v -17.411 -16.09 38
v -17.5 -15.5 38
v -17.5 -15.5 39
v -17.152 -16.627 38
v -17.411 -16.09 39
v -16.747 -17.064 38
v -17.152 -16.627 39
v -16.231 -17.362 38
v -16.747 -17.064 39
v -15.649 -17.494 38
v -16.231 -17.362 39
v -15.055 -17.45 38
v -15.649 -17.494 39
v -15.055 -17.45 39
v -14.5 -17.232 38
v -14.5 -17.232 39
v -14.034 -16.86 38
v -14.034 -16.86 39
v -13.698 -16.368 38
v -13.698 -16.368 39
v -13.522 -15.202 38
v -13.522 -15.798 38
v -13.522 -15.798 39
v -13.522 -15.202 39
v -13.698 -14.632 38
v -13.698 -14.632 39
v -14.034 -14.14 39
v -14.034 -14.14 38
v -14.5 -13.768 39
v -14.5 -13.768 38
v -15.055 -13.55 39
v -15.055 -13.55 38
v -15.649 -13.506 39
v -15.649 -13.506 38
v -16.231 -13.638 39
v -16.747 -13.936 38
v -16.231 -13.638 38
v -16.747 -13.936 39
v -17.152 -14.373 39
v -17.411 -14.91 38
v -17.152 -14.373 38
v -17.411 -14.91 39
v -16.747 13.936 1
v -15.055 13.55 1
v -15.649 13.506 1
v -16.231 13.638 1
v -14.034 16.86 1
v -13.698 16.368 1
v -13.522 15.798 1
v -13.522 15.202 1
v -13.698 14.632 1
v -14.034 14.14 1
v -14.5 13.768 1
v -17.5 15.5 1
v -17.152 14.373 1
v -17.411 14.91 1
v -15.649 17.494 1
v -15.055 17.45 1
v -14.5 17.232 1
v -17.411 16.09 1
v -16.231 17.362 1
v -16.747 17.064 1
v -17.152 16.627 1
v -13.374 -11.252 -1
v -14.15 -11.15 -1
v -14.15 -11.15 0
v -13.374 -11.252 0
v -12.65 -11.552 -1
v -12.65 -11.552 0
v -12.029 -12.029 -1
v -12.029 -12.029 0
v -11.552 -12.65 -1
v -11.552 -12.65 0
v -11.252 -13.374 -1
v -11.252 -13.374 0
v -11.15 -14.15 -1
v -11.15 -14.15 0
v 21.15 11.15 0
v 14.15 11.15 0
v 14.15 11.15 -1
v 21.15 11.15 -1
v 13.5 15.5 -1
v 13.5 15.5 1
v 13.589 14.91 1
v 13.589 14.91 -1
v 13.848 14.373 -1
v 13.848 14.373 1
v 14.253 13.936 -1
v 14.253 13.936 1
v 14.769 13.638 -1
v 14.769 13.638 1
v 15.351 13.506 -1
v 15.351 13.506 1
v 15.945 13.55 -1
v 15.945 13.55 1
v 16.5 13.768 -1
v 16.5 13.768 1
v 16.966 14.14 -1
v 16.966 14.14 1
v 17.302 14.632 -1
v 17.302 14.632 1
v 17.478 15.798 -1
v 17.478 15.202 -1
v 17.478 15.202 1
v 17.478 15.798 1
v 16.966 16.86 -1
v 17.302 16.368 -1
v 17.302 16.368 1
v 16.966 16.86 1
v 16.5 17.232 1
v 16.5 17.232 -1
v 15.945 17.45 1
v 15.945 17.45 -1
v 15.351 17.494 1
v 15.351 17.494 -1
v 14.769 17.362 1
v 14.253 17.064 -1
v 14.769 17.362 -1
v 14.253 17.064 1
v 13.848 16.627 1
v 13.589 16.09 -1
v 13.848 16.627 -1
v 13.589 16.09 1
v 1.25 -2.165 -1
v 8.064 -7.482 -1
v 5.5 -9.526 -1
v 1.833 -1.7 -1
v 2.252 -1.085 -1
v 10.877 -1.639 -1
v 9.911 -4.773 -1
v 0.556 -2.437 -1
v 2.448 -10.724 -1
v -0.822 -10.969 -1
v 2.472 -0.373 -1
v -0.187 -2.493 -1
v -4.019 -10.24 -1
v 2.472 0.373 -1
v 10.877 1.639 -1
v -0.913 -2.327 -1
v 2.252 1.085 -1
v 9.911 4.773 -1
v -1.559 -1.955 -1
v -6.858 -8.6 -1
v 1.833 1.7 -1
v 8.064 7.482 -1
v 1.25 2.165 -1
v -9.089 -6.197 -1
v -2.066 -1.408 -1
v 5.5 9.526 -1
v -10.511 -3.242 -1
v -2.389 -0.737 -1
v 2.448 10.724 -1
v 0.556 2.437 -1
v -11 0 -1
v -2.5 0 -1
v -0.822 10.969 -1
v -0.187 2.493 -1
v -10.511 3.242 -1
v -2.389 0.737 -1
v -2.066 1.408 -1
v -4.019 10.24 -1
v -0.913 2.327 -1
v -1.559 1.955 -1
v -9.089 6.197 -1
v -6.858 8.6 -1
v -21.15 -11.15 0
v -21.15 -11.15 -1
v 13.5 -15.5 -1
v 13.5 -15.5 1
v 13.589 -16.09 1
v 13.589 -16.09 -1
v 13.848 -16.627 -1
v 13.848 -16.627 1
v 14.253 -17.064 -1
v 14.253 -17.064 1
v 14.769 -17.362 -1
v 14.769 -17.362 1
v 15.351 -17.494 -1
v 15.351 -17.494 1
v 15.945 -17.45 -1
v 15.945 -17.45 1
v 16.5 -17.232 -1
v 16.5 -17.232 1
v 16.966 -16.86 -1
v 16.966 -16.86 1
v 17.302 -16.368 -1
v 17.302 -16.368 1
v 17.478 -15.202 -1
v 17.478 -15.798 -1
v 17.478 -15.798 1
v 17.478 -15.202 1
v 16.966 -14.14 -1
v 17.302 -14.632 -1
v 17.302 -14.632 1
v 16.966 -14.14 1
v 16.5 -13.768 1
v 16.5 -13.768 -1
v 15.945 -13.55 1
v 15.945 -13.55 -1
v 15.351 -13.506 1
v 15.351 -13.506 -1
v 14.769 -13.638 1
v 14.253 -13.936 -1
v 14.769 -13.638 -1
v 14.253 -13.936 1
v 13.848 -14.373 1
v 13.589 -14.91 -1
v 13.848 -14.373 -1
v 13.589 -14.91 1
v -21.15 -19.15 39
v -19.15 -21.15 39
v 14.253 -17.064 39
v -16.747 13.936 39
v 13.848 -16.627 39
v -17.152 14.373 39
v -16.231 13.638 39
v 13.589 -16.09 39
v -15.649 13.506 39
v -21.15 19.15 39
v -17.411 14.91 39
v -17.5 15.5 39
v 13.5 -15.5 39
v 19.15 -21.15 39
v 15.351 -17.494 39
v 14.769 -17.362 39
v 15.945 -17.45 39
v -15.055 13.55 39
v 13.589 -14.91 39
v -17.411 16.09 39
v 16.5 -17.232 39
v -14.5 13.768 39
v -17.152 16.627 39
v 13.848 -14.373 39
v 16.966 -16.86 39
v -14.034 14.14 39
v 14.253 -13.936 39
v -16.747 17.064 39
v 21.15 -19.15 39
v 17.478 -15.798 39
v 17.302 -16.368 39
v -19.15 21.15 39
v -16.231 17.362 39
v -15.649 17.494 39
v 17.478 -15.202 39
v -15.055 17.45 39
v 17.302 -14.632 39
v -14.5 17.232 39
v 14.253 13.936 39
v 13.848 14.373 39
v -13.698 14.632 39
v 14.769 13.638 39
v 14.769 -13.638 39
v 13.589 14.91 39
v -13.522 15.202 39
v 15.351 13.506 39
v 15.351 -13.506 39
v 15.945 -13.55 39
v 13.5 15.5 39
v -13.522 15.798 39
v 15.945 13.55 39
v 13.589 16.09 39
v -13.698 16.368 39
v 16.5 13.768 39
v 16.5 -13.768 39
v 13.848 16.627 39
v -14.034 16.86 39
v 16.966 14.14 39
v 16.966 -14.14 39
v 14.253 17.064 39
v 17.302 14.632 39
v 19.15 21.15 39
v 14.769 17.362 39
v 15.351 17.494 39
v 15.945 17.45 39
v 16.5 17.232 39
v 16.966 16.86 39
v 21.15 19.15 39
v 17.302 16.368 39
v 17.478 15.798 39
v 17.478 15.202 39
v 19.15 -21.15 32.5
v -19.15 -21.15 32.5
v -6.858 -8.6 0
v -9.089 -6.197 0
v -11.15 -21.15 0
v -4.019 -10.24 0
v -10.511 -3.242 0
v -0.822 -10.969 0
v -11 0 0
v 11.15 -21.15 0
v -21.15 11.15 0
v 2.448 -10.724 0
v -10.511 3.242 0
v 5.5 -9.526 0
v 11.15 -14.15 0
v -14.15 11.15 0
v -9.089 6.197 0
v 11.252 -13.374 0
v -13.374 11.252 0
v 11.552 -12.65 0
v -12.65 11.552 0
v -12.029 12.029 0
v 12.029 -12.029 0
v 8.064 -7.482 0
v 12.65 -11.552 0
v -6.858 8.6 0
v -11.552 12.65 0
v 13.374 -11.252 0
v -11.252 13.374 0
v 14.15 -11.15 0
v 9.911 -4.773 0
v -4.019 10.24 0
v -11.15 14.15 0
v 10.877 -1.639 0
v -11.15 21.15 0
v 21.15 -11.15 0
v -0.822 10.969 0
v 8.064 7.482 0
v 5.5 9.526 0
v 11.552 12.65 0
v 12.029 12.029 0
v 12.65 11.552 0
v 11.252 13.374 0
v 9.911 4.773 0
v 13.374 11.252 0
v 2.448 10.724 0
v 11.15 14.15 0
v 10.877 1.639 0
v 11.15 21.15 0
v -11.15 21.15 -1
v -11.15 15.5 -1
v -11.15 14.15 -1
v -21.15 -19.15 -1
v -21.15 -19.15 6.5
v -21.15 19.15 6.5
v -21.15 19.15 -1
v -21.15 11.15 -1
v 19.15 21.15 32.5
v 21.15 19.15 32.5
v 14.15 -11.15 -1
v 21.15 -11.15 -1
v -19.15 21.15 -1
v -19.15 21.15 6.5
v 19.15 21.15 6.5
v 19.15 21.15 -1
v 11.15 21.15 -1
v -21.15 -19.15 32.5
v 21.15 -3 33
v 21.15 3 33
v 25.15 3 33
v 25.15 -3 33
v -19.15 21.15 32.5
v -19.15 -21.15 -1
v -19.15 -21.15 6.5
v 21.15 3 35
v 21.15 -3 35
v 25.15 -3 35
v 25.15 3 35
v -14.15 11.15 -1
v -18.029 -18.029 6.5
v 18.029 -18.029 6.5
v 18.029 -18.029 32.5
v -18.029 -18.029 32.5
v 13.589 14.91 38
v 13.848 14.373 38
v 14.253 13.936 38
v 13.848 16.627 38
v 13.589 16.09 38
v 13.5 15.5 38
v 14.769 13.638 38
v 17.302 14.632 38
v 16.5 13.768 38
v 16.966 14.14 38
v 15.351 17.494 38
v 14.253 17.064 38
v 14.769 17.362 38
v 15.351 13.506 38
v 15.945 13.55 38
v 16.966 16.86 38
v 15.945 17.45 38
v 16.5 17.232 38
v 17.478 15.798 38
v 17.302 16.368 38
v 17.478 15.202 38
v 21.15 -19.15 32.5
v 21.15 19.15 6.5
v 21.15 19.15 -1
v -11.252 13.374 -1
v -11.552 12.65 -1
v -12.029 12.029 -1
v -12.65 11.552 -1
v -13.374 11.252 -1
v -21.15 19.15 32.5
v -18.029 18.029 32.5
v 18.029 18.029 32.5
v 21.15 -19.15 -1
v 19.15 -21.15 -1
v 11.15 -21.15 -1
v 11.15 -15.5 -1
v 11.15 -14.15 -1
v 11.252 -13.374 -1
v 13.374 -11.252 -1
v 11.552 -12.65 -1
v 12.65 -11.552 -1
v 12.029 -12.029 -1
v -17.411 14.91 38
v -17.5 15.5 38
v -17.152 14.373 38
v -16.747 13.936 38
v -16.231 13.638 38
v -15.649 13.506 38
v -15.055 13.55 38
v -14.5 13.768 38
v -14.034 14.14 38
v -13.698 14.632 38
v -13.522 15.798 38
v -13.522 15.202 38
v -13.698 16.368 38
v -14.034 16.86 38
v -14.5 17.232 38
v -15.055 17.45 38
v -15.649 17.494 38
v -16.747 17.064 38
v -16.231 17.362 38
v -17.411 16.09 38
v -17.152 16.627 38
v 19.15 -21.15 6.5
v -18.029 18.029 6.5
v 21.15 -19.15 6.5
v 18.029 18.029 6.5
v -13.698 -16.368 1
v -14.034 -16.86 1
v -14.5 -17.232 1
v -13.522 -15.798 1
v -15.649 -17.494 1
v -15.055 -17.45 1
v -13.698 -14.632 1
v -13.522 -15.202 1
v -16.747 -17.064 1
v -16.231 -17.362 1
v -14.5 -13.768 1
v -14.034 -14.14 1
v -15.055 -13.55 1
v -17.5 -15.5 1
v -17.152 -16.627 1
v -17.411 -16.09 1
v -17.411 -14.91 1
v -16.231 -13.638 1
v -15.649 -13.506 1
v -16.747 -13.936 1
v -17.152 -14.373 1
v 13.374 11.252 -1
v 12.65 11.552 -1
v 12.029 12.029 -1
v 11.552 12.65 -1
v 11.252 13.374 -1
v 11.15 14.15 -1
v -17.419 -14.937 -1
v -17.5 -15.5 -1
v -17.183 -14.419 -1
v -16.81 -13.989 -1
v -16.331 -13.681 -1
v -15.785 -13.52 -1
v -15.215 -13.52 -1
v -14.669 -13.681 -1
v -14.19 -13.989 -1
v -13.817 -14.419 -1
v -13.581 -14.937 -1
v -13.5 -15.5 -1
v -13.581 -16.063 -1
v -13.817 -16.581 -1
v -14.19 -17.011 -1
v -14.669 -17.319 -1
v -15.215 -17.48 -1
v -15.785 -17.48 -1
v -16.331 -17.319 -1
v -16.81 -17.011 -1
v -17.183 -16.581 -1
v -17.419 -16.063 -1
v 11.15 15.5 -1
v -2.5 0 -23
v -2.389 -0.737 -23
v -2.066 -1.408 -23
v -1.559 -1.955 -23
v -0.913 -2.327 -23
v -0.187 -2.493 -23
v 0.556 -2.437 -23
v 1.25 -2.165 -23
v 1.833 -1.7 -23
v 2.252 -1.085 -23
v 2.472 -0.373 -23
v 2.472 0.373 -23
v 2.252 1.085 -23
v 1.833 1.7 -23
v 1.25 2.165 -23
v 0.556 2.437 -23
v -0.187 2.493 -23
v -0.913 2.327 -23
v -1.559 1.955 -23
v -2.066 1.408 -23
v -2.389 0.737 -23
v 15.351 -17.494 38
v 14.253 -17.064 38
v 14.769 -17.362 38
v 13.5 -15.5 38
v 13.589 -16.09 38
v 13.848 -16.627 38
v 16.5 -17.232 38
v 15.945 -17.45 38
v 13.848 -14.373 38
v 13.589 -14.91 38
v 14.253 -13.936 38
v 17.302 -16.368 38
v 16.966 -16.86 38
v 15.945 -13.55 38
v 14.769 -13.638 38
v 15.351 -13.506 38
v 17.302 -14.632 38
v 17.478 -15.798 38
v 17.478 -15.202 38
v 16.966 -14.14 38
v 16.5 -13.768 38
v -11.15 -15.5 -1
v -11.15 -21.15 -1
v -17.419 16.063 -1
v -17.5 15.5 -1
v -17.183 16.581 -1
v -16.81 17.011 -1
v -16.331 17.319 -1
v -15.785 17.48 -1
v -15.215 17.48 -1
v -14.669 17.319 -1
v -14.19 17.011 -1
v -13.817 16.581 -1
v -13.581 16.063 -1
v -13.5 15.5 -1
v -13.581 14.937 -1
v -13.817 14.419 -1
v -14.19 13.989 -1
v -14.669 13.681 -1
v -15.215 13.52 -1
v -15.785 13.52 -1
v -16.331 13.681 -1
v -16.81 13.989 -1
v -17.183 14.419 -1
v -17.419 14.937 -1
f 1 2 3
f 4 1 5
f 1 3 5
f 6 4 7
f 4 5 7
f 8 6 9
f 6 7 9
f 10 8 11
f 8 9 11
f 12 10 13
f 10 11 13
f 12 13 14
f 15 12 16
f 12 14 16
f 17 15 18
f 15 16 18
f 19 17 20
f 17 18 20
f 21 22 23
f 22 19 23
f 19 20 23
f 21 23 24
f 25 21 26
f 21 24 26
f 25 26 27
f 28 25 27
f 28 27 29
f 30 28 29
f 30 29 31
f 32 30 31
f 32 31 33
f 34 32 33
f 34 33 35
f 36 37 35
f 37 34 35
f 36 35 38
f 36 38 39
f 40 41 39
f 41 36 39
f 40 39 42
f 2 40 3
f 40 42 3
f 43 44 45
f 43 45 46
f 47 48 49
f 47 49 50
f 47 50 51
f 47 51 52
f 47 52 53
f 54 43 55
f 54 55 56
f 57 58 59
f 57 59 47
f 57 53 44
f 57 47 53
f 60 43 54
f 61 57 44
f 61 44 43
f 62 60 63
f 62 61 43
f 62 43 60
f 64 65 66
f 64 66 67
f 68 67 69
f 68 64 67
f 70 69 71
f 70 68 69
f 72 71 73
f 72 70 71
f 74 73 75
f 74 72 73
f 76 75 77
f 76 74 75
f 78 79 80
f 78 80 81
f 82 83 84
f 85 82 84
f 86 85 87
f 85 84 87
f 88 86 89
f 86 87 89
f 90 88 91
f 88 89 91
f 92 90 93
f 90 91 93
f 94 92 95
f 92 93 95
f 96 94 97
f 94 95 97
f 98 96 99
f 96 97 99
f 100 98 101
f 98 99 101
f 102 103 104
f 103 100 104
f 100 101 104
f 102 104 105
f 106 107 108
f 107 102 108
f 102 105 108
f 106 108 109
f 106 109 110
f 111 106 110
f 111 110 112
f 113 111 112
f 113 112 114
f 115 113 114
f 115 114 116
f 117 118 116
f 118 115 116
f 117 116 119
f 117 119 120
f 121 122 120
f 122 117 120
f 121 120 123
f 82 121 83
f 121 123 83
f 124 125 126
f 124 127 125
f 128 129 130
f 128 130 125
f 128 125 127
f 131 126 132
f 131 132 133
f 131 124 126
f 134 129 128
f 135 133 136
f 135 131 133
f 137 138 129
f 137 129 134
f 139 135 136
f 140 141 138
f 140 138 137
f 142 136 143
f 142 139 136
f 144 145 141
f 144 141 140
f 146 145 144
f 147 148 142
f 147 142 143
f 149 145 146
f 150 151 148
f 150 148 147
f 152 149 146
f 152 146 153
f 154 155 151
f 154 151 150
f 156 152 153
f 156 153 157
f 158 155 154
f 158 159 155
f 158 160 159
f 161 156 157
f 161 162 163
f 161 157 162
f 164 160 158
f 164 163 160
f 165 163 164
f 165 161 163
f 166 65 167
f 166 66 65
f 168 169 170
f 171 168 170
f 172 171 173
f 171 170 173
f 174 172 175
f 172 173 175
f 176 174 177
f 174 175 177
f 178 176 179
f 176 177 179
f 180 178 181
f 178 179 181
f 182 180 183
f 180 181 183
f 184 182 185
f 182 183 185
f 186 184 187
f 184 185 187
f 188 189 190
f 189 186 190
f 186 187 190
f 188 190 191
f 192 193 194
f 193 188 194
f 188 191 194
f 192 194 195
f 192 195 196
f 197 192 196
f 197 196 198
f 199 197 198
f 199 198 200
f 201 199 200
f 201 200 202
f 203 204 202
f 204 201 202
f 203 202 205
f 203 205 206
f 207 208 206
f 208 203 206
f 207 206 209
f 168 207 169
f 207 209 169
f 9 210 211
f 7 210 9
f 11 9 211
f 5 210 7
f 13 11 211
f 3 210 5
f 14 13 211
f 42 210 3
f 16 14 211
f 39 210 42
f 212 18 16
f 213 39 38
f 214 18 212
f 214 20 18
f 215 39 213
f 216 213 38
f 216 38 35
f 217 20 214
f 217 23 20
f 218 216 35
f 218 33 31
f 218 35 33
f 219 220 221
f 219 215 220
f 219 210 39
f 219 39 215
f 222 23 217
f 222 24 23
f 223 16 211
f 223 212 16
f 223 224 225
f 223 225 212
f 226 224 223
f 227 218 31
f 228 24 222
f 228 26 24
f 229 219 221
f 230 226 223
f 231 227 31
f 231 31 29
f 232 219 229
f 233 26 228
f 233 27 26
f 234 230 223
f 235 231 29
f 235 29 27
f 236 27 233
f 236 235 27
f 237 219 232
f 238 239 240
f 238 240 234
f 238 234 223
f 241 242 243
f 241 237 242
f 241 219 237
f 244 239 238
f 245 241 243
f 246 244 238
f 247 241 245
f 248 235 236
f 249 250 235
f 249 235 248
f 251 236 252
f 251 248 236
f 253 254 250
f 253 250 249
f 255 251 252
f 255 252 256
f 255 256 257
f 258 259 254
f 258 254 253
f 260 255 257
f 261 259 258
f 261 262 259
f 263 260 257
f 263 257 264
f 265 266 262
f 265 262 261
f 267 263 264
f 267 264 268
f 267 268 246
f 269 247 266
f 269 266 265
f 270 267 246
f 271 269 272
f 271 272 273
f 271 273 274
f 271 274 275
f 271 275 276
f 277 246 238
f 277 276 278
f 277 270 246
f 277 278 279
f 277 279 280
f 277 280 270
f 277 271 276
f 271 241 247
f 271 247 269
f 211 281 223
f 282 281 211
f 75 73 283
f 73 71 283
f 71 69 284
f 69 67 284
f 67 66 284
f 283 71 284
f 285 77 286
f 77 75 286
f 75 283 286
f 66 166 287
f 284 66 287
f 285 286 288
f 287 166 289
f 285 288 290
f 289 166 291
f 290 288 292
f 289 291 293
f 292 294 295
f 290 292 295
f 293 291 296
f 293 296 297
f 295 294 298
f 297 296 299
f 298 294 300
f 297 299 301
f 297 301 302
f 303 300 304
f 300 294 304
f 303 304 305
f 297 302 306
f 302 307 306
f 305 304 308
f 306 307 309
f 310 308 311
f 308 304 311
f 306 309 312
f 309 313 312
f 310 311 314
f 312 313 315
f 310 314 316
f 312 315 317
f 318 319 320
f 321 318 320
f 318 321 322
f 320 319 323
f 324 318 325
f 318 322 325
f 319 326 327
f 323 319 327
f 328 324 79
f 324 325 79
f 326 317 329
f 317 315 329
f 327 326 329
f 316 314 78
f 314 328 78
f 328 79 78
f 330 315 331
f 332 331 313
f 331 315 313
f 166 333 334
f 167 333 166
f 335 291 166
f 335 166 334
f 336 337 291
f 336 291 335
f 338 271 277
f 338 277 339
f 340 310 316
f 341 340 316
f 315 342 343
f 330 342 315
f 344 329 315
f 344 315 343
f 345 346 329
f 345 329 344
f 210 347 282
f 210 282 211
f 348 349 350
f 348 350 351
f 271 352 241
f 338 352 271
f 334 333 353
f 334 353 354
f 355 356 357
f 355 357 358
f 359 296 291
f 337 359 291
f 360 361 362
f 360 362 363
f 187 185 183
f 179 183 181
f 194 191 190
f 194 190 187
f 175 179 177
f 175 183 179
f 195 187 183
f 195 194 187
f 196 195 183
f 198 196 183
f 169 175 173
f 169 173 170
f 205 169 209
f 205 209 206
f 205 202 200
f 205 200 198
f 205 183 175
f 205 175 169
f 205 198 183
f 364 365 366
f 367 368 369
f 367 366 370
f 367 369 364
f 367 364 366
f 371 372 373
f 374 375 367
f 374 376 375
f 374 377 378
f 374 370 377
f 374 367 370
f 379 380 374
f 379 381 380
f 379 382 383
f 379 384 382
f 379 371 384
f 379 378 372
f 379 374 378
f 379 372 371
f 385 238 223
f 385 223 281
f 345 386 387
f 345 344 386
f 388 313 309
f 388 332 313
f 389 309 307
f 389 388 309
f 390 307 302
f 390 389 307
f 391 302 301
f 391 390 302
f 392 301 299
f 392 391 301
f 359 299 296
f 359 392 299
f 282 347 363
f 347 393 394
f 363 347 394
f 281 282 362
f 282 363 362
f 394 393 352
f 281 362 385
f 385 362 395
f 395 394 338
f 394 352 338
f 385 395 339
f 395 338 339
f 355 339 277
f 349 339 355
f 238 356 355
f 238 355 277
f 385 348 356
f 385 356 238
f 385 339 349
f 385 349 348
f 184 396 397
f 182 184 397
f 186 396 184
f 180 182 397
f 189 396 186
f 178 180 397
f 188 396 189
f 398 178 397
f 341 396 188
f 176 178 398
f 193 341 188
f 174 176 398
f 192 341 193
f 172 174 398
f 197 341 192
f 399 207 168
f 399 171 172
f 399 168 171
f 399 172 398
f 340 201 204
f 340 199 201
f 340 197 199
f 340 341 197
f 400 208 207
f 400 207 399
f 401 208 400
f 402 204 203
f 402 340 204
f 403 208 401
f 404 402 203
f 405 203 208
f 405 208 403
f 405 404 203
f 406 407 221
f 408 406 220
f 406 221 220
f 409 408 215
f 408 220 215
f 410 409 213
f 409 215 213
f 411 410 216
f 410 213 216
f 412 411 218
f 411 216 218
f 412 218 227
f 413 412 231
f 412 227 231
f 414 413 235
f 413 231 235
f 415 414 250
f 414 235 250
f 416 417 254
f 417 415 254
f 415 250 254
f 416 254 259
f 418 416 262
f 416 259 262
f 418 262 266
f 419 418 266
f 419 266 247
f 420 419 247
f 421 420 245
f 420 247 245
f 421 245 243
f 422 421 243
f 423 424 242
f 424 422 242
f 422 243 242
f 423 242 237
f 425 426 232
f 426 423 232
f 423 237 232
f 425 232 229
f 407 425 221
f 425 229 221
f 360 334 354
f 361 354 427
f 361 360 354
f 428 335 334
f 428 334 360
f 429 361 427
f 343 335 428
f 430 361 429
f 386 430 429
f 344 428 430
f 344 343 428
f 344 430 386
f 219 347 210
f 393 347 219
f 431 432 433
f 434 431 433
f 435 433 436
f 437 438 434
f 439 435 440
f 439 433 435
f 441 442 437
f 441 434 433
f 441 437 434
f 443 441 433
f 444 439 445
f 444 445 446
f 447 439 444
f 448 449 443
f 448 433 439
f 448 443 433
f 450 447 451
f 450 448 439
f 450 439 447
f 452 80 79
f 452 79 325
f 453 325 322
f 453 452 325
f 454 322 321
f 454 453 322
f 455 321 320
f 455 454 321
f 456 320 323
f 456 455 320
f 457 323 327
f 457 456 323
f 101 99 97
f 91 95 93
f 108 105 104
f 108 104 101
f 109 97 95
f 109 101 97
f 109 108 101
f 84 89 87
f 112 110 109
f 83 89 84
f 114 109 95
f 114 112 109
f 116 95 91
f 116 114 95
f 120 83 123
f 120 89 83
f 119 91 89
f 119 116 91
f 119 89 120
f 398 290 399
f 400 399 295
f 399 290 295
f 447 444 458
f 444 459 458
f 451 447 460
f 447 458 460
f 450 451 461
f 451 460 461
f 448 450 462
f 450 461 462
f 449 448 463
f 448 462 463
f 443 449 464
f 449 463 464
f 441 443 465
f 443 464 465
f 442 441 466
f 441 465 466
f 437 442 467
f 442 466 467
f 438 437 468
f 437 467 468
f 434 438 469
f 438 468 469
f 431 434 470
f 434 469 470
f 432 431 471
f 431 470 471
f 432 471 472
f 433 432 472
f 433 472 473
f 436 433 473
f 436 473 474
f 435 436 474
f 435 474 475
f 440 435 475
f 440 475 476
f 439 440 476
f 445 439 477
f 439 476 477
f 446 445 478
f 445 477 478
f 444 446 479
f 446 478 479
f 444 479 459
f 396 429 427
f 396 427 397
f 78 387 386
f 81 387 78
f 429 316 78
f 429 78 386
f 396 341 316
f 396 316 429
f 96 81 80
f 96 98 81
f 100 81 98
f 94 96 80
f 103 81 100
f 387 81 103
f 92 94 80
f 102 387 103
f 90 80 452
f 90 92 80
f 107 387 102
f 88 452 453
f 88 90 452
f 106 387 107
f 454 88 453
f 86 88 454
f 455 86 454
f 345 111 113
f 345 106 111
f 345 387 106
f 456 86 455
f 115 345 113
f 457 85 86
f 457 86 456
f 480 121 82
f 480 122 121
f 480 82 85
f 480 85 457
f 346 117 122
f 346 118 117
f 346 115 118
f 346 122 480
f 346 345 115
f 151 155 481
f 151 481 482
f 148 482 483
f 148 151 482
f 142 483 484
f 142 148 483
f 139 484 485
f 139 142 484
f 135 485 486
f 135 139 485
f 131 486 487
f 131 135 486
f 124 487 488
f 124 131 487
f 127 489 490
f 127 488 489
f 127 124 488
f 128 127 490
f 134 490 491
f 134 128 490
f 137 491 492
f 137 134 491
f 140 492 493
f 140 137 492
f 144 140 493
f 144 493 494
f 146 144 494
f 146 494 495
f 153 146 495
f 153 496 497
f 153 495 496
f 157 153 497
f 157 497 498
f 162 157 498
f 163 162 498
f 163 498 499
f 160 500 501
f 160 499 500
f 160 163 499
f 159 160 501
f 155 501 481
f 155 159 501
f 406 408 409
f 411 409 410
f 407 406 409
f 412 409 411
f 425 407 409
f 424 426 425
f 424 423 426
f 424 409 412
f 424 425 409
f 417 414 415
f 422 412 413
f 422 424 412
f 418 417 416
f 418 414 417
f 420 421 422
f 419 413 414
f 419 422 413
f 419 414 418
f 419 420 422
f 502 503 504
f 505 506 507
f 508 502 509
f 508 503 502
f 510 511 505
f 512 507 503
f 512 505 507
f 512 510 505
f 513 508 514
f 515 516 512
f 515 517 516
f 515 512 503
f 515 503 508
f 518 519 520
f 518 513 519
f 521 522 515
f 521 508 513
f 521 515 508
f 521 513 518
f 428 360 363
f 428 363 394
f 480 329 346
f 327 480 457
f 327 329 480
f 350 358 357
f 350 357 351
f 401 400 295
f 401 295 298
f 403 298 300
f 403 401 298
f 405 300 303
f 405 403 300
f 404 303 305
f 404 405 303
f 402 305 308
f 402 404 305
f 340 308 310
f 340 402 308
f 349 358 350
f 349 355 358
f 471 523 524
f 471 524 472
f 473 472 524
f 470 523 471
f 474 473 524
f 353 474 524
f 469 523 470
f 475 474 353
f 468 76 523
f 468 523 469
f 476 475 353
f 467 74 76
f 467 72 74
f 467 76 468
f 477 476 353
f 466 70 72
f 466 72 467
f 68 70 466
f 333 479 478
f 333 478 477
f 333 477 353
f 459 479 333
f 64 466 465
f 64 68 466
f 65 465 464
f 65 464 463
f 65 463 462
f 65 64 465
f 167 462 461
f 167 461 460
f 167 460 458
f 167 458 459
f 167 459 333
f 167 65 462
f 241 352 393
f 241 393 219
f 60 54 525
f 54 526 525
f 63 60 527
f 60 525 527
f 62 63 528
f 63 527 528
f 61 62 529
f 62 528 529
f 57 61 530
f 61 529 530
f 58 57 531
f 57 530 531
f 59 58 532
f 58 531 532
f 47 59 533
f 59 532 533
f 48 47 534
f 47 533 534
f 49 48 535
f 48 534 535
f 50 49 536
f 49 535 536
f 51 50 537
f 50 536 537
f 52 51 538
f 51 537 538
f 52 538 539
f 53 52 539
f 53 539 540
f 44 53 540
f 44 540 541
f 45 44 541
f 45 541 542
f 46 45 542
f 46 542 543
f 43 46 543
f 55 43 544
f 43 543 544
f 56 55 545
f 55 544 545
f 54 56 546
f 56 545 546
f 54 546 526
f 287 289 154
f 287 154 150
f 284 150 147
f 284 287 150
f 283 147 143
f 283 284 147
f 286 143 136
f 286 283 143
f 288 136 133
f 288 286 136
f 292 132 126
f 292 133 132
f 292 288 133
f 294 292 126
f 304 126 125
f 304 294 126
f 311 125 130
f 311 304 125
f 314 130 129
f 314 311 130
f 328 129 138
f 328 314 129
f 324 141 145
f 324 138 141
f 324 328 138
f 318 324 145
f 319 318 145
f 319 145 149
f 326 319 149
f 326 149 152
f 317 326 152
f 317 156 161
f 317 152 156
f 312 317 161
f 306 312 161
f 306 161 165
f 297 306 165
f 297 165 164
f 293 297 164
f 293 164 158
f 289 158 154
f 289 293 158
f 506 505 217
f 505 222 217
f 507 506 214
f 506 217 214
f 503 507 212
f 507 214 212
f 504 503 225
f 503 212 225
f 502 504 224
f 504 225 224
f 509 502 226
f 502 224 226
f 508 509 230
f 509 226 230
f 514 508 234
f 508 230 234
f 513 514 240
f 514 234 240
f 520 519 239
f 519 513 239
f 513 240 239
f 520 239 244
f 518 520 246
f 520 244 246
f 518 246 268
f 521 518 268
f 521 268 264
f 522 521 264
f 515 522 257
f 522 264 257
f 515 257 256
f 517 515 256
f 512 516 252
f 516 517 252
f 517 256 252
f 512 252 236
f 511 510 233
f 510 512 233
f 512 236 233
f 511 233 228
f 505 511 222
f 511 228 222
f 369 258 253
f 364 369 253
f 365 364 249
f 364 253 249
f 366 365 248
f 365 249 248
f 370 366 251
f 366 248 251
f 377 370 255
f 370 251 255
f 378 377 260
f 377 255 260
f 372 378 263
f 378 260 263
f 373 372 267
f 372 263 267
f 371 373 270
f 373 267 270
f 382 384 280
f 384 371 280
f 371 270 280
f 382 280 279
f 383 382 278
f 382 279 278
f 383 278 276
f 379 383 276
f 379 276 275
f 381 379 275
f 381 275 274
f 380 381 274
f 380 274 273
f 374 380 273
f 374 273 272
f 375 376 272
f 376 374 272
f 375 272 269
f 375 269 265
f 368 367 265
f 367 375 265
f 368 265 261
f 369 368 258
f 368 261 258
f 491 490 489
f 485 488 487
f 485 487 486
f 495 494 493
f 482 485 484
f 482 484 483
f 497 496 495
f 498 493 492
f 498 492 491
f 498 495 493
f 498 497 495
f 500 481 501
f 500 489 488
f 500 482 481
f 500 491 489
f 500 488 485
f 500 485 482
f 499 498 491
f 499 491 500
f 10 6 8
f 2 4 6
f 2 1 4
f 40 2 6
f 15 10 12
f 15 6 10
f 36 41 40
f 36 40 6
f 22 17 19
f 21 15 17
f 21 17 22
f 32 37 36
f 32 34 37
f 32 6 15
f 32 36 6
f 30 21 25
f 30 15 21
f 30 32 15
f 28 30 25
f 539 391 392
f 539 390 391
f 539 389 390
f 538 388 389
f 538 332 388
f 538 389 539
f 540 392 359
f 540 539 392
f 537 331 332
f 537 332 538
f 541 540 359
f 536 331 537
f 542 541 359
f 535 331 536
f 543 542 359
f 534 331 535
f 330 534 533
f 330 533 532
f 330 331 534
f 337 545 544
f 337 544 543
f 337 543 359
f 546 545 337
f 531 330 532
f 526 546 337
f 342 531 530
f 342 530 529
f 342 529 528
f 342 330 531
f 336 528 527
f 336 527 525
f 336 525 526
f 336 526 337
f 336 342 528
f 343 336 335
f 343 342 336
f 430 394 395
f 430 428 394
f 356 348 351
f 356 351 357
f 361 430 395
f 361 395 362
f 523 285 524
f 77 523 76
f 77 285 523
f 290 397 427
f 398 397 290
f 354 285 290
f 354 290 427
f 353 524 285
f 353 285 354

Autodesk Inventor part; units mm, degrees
ref_plane "YZ Plane" through (0, 0, 0) normal (1, 0, 0) x (0, 1, 0)
ref_plane "XZ Plane" through (0, 0, 0) normal (0, 1, 0) x (-1, 0, 0)
sketch "Sketch1" plane through (0, 0, 0) normal (0, 0, 1) x (1, 0, 0)
  line L0 (0, 0) -> (0, 3.4207)
  line L1 (0, 0) -> (9.2929, 0)
  line L2 (21.15, -21.15) -> (-21.15, -21.15)
  line L3 (-21.15, -21.15) -> (-21.15, 21.15)
  line L4 (-21.15, 21.15) -> (21.15, 21.15)
  line L5 (21.15, 21.15) -> (21.15, -21.15)
  point P0 (0, 21.15)
  point P1 (21.15, 0)
  dimension "d0" = 42.3
  dimension "d1" = 42.3
extrude "Extrusion1" add sketch "Sketch1" along normal blind 39
sketch "Sketch2" plane through (0, 0, 0) normal (0, 0, -1) x (-1, 0, 0)
  line L0 (-21.15, 21.15) -> (-21.15, -21.15) projected
  circle A0 centre (-15.5, 15.5) radius 2
  circle A1 centre (15.5, 15.5) radius 2
  line L1 (-15.5, 15.5) -> (15.5, 15.5)
  line L2 (0, 0) -> (0, 5.3355)
  line L3 (0, 0) -> (5.467, 0)
  circle A2 centre (-15.5, -15.5) radius 2
  circle A3 centre (15.5, -15.5) radius 2
  line L4 (-15.5, -15.5) -> (15.5, -15.5)
  line L5 (-21.15, 21.15) -> (-11.15, 21.15)
  line L6 (-11.15, 21.15) -> (-11.15, 11.15)
  line L7 (-11.15, 11.15) -> (-21.15, 11.15)
  line L8 (-21.15, 11.15) -> (-21.15, 21.15)
  line L9 (21.15, 21.15) -> (11.15, 21.15)
  line L10 (11.15, 21.15) -> (11.15, 11.15)
  line L11 (11.15, 11.15) -> (21.15, 11.15)
  line L12 (21.15, 11.15) -> (21.15, 21.15)
  line L13 (21.15, -21.15) -> (11.15, -21.15)
  line L14 (11.15, -21.15) -> (11.15, -11.15)
  line L15 (11.15, -11.15) -> (21.15, -11.15)
  line L16 (21.15, -11.15) -> (21.15, -21.15)
  line L17 (-21.15, -21.15) -> (-11.15, -21.15)
  line L18 (-11.15, -21.15) -> (-11.15, -11.15)
  line L19 (-11.15, -11.15) -> (-21.15, -11.15)
  line L20 (-21.15, -11.15) -> (-21.15, -21.15)
  circle A4 centre (0, 0) radius 11
  point P0 (0, 15.5)
  point P1 (0, -15.5)
  dimension "d4" = 4
  dimension "d5" = 4
  dimension "d6" = 31
  dimension "d7" = 31
  dimension "d8" = 10
  dimension "d9" = 10
  dimension "d10" = 10
  dimension "d11" = 10
  dimension "d12" = 10
  dimension "d13" = 10
  dimension "d14" = 10
  dimension "d15" = 10
  dimension "d20" = 22
extrude "Extrusion2" add sketch "Sketch2" along normal blind 1 contours A0 | L5 L6 L7 L0 | A1 | L10 L9 L12 L11 | A3 | L14 L15 L16 L13 | A2 | L19 L18 L17 L0
extrude "Extrusion3" cut sketch "Sketch2" along normal mid plane 2 contours A0 | A1 | A3 | A2
extrude "Extrusion4" add sketch "Sketch2" along normal blind 1 contours A4
fillet "Fillet1" radius 3 4 edges at (11.15, 11.15, -0.5) (11.15, -11.15, -0.5) (-11.15, -11.15, -0.5) (-11.15, 11.15, -0.5)
chamfer "Chamfer1" distance 2 angle 45 4 edges at (21.15, -21.15, 19) (-21.15, -21.15, 19) (-21.15, 21.15, 19) (21.15, 21.15, 19)
sketch "Sketch3" plane through (0, 0, -1) normal (0, 0, -1) x (-1, 0, 0)
  circle A0 centre (0, 0) radius 11 projected
  circle A1 centre (0, 0) radius 2.5
  dimension "d27" = 5
extrude "Extrusion5" add sketch "Sketch3" along normal blind 22 contours A1
ref_plane "Work Plane1" through (0, 0, 19.5) normal (0, 0, 1) x (1, 0, 0)
mirror "Mirror1" about plane through (0, 0, 19.5) normal (0, 0, 1) of "Extrusion3"
sketch "Sketch4" plane through (21.15, -11.15, 0) normal (1, 0, 0) x (0, 0, -1)
  line L0 (-39, -8) -> (-39, 30.3) projected
  line L1 (-35, 14.15) -> (-33, 14.15)
  line L2 (-33, 14.15) -> (-33, 8.15)
  line L3 (-33, 8.15) -> (-35, 8.15)
  line L4 (-35, 8.15) -> (-35, 14.15)
  line L5 (-39, 11.15) -> (-36.6866, 11.15)
  point P0 (0, 11.15)
  point P1 (-35, 11.15)
  dimension "d31" = 2
  dimension "d32" = 6
  dimension "d33" = 4
extrude "Extrusion6" add sketch "Sketch4" along normal blind 4
sketch "Sketch6" plane through (0, 0, 19.5) normal (0, 0, 1) x (1, 0, 0)
  line L0 (-21.15, 19.15) -> (-19.15, 21.15) projected
  line L1 (-19.15, 21.15) -> (19.15, 21.15) projected
  line L2 (19.15, 21.15) -> (21.15, 19.15) projected
  line L3 (21.15, 19.15) -> (21.15, -19.15) projected
  line L4 (21.15, -19.15) -> (19.15, -21.15) projected
  line L5 (19.15, -21.15) -> (-19.15, -21.15) projected
  line L6 (-19.15, -21.15) -> (-21.15, -19.15) projected
  line L7 (-21.15, -19.15) -> (-21.15, 19.15) projected
  line L8 (-17.7379, 17.7408) -> (-17.7408, 17.7379)
  line L9 (-17.7408, -17.7379) -> (-17.7379, -17.7408)
  line L10 (17.7379, -17.7408) -> (17.7408, -17.7379)
  line L11 (17.7408, 17.7379) -> (17.7379, 17.7408)
  line L12 (-21.15, 14.9074) -> (-14.9074, 21.15)
  line L13 (-18.0287, 18.0287) -> (18.0287, 18.0287)
  line L14 (18.0287, 18.0287) -> (18.0287, -18.0287)
  line L15 (18.0287, -18.0287) -> (-18.0287, -18.0287)
  line L16 (-18.0287, -18.0287) -> (-18.0287, 18.0287)
  line L17 (-21.15, 14.9074) -> (-21.15, 19.15)
  line L18 (-19.15, 21.15) -> (-21.15, 19.15)
  line L19 (-19.15, 21.15) -> (-14.9074, 21.15)
  line L20 (-14.9074, -21.15) -> (-21.15, -14.9074)
  line L21 (-14.9074, -21.15) -> (-19.15, -21.15)
  line L22 (-21.15, -19.15) -> (-19.15, -21.15)
  line L23 (-21.15, -19.15) -> (-21.15, -14.9074)
  line L24 (21.15, -14.9074) -> (14.9074, -21.15)
  line L25 (21.15, -14.9074) -> (21.15, -19.15)
  line L26 (19.15, -21.15) -> (21.15, -19.15)
  line L27 (19.15, -21.15) -> (14.9074, -21.15)
  line L28 (14.9074, 21.15) -> (21.15, 14.9074)
  line L29 (14.9074, 21.15) -> (19.15, 21.15)
  line L30 (21.15, 19.15) -> (19.15, 21.15)
  line L31 (21.15, 19.15) -> (21.15, 14.9074)
  line L32 (-21.15, 14.9074) -> (-21.15, -14.9074)
  line L33 (-14.9074, -21.15) -> (14.9074, -21.15)
  line L34 (21.15, -14.9074) -> (21.15, 14.9074)
  line L35 (14.9074, 21.15) -> (-14.9074, 21.15)
  point P0 (0, 0)
  point P1 (18.0287, -18.0287)
  dimension "d43" = 3
  dimension "d46" = 360
extrude "Extrusion8" cut sketch "Sketch6" along normal mid plane 26 contours L0 L1 L12 L7 | L12 L16 L20 L7 | L1 L28 L13 L12 | L20 L5 L6 L7 | L1 L2 L3 L28 | L15 L24 L5 L20 | L28 L3 L24 L14 | L24 L3 L4 L5
properties part number "Stepper Motor NEMA 17" material "Rubber"
